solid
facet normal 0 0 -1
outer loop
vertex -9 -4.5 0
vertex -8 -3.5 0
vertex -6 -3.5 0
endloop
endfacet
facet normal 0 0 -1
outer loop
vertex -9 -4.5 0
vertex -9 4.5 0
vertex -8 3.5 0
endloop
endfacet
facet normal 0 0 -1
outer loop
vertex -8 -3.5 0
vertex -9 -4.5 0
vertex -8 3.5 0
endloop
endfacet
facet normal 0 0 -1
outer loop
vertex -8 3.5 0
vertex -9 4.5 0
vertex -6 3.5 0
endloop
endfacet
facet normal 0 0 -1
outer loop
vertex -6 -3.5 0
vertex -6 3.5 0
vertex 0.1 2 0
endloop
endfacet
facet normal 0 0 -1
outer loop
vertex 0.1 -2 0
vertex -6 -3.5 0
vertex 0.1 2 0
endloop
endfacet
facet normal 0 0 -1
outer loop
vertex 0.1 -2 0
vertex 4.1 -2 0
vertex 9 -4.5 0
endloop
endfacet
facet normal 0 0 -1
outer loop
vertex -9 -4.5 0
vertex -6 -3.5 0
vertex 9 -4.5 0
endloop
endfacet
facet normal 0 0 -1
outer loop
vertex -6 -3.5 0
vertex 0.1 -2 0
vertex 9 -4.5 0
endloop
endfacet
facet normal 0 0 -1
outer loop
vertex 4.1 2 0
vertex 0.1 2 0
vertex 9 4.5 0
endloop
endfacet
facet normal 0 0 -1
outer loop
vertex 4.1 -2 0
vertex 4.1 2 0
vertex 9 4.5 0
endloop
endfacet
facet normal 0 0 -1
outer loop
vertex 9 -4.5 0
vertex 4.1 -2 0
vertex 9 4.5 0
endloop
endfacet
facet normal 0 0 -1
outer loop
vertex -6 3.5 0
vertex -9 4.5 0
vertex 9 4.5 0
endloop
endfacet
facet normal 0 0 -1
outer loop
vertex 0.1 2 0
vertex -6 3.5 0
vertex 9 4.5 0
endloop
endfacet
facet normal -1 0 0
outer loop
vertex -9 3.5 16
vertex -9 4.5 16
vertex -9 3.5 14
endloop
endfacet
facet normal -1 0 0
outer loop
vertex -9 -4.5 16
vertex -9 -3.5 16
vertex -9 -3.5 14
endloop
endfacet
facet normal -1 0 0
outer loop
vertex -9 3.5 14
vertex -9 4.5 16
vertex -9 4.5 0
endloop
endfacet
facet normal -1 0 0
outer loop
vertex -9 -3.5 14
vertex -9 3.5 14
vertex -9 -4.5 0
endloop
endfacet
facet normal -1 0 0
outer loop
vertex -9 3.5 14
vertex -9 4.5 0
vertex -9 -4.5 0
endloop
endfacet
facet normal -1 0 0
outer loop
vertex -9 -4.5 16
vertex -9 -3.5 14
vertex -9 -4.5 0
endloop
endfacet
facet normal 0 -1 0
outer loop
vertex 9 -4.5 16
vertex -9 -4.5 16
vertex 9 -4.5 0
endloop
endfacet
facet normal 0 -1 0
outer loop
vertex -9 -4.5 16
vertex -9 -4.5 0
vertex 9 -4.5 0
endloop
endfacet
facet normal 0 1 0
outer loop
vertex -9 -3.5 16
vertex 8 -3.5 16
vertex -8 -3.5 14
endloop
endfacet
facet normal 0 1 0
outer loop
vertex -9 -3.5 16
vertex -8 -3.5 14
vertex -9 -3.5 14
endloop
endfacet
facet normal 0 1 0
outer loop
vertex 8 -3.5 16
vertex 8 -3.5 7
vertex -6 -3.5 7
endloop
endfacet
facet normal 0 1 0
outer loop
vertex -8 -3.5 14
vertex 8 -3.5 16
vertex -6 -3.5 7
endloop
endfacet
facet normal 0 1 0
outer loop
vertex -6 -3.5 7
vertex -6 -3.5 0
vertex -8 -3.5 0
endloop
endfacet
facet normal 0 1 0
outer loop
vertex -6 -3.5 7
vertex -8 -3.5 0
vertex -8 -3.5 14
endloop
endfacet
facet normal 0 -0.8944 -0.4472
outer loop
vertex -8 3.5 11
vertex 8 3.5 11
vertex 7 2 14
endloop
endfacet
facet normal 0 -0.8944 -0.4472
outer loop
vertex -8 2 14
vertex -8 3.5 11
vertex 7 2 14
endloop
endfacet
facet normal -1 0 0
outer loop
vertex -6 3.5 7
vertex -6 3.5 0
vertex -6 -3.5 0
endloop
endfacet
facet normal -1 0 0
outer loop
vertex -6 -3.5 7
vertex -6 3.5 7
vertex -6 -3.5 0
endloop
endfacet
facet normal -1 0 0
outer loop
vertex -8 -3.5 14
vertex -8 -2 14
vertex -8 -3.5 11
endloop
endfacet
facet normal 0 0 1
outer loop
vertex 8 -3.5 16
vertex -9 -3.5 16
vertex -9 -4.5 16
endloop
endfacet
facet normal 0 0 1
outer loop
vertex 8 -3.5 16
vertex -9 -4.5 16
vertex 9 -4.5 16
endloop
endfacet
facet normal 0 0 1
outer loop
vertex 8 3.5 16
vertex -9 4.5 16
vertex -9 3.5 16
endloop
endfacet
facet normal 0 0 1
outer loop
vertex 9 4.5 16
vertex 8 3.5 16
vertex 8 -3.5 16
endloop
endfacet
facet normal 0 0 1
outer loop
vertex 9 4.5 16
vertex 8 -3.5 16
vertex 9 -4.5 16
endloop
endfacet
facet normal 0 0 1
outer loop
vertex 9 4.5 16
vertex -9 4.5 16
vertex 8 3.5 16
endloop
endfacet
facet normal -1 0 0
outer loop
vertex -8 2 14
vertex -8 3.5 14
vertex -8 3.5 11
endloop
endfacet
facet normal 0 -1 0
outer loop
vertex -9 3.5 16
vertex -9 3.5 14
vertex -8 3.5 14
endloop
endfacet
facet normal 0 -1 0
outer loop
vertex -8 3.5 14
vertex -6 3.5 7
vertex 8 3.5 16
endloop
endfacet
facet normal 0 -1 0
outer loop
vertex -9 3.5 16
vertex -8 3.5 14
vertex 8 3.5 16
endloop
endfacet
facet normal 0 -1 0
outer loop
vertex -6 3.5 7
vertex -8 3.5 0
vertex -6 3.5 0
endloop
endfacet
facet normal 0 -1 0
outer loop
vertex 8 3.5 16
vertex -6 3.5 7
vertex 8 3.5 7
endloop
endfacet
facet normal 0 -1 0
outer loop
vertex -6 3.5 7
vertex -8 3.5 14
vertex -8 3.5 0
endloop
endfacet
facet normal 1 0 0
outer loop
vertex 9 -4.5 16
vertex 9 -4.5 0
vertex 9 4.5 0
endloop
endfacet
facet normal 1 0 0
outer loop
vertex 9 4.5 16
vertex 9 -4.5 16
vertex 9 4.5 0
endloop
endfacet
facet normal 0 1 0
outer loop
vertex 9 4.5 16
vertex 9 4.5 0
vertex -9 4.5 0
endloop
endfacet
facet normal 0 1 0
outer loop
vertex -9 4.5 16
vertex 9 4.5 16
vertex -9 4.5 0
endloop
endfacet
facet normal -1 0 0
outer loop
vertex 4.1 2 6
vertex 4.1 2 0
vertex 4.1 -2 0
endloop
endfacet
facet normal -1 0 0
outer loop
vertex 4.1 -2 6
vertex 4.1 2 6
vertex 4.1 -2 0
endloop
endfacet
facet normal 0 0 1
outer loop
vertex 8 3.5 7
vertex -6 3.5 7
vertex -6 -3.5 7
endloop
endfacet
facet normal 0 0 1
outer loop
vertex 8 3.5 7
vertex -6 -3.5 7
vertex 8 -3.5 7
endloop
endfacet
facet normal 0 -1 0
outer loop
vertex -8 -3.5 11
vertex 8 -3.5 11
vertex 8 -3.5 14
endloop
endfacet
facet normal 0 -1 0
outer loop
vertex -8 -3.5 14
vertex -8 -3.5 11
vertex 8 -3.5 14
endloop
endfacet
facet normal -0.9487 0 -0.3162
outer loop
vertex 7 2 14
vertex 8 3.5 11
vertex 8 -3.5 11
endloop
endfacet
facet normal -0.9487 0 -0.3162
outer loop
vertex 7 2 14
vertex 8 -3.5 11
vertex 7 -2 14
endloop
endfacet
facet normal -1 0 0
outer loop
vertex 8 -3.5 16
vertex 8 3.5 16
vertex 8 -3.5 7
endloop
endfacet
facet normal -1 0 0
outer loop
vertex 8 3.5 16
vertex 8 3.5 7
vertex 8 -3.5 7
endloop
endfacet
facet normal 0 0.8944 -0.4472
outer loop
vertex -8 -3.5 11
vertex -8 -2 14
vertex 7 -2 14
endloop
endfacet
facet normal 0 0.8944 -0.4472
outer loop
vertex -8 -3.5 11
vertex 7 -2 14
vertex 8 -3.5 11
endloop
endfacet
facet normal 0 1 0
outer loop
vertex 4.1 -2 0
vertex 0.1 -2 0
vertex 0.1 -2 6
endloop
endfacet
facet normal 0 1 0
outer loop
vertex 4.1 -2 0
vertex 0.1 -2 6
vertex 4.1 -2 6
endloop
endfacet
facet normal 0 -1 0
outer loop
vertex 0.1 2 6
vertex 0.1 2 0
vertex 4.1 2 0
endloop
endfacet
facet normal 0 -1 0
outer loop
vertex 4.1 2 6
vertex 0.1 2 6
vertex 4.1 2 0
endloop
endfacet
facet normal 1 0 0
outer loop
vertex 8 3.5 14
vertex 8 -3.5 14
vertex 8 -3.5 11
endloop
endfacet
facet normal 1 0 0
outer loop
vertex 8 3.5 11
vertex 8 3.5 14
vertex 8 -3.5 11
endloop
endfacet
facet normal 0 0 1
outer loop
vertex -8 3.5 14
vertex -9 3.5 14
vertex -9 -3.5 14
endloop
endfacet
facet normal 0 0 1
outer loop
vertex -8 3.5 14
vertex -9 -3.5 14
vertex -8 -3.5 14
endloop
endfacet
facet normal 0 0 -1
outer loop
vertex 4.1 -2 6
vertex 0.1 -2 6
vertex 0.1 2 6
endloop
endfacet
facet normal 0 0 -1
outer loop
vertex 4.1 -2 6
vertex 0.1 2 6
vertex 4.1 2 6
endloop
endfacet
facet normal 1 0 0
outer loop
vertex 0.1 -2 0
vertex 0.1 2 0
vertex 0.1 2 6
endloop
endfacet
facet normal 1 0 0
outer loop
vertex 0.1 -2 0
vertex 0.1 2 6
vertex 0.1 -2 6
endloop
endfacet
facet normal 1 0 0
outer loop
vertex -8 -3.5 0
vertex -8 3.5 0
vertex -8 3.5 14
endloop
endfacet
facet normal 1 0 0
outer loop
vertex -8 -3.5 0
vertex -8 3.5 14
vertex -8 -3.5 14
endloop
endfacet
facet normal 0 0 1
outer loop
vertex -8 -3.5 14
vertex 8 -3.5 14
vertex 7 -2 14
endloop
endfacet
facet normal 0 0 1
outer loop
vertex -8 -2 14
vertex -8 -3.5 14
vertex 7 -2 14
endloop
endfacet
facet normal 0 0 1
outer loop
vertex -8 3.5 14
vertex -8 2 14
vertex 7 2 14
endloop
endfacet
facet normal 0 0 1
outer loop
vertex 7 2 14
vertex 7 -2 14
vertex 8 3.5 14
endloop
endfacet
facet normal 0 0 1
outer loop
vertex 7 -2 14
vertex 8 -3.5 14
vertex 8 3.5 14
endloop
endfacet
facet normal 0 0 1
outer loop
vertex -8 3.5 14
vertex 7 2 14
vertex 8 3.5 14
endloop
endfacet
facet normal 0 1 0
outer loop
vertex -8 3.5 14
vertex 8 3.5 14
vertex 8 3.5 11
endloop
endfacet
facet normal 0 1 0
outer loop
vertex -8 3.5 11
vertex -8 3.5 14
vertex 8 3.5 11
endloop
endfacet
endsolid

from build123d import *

# Parameters (mm, degrees)
F0_W      = 18
F0_H      = 9
F1_DEPTH  = 14
F2_W      = 16
F2_H      = 7
F3_DEPTH  = 7
F4_W      = 4
F4_H      = 4
F5_DEPTH  = 6
F4_W_2    = 2
F4_H_2    = 7
F6_DEPTH  = 9
F8_DEPTH  = 2
F10_DEPTH = 7
F12_DEPTH = 16


with BuildPart() as f1:
    # F0 (on Top) → F1 (new body)
    with BuildSketch(Plane.XY):
        Rectangle(F0_W, F0_H)
    extrude(amount=F1_DEPTH)

    # F2 (on face) → F3 (cut)
    with BuildSketch(Plane.XY.offset(14)):
        Rectangle(F2_W, F2_H)
    extrude(amount=-F3_DEPTH, mode=Mode.SUBTRACT)

    # F4 (on face) → F5 (cut)
    with BuildSketch(Plane(origin=(0, 0, 0), x_dir=(1, 0, 0), z_dir=(0, 0, -1))):
        with Locations((2.1, 0)):
            Rectangle(F4_W, F4_H)
    extrude(amount=-F5_DEPTH, mode=Mode.SUBTRACT)

    # F4 (on face) → F6 (cut)
    with BuildSketch(Plane(origin=(0, 0, 0), x_dir=(1, 0, 0), z_dir=(0, 0, -1))):
        with Locations((-7, 0)):
            Rectangle(F4_W_2, F4_H_2)
    extrude(amount=-F6_DEPTH, mode=Mode.SUBTRACT)

    # F7 (on face) → F8 (join)
    with BuildSketch(Plane.XY.offset(14)):
        Polygon((9, 4.5), (-9, 4.5), (-9, 3.5), (8, 3.5), (8, -3.5), (-9, -3.5), (-9, -4.5), (9, -4.5), align=None)
    extrude(amount=F8_DEPTH)


with BuildPart() as f10:
    # F9 (on face) → F10 (new body)
    with BuildSketch(Plane(origin=(0, -3.5, 0), x_dir=(-1, 0, 0), z_dir=(0, 1, 0))):
        Polygon((-7, 14), (-8, 14), (-8, 11), align=None)
    extrude(amount=F10_DEPTH)

    # F11 (on face) → F12 (join)
    with BuildSketch(Plane(origin=(8, 0, 0), x_dir=(0, -1, 0), z_dir=(-1, 0, 0))):
        Polygon((3.5, 11), (3.5, 14), (2, 14), align=None)
        Polygon((-3.5, 11), (-2, 14), (-3.5, 14), align=None)
    extrude(amount=F12_DEPTH)


solid = Compound([f1.part, f10.part])
